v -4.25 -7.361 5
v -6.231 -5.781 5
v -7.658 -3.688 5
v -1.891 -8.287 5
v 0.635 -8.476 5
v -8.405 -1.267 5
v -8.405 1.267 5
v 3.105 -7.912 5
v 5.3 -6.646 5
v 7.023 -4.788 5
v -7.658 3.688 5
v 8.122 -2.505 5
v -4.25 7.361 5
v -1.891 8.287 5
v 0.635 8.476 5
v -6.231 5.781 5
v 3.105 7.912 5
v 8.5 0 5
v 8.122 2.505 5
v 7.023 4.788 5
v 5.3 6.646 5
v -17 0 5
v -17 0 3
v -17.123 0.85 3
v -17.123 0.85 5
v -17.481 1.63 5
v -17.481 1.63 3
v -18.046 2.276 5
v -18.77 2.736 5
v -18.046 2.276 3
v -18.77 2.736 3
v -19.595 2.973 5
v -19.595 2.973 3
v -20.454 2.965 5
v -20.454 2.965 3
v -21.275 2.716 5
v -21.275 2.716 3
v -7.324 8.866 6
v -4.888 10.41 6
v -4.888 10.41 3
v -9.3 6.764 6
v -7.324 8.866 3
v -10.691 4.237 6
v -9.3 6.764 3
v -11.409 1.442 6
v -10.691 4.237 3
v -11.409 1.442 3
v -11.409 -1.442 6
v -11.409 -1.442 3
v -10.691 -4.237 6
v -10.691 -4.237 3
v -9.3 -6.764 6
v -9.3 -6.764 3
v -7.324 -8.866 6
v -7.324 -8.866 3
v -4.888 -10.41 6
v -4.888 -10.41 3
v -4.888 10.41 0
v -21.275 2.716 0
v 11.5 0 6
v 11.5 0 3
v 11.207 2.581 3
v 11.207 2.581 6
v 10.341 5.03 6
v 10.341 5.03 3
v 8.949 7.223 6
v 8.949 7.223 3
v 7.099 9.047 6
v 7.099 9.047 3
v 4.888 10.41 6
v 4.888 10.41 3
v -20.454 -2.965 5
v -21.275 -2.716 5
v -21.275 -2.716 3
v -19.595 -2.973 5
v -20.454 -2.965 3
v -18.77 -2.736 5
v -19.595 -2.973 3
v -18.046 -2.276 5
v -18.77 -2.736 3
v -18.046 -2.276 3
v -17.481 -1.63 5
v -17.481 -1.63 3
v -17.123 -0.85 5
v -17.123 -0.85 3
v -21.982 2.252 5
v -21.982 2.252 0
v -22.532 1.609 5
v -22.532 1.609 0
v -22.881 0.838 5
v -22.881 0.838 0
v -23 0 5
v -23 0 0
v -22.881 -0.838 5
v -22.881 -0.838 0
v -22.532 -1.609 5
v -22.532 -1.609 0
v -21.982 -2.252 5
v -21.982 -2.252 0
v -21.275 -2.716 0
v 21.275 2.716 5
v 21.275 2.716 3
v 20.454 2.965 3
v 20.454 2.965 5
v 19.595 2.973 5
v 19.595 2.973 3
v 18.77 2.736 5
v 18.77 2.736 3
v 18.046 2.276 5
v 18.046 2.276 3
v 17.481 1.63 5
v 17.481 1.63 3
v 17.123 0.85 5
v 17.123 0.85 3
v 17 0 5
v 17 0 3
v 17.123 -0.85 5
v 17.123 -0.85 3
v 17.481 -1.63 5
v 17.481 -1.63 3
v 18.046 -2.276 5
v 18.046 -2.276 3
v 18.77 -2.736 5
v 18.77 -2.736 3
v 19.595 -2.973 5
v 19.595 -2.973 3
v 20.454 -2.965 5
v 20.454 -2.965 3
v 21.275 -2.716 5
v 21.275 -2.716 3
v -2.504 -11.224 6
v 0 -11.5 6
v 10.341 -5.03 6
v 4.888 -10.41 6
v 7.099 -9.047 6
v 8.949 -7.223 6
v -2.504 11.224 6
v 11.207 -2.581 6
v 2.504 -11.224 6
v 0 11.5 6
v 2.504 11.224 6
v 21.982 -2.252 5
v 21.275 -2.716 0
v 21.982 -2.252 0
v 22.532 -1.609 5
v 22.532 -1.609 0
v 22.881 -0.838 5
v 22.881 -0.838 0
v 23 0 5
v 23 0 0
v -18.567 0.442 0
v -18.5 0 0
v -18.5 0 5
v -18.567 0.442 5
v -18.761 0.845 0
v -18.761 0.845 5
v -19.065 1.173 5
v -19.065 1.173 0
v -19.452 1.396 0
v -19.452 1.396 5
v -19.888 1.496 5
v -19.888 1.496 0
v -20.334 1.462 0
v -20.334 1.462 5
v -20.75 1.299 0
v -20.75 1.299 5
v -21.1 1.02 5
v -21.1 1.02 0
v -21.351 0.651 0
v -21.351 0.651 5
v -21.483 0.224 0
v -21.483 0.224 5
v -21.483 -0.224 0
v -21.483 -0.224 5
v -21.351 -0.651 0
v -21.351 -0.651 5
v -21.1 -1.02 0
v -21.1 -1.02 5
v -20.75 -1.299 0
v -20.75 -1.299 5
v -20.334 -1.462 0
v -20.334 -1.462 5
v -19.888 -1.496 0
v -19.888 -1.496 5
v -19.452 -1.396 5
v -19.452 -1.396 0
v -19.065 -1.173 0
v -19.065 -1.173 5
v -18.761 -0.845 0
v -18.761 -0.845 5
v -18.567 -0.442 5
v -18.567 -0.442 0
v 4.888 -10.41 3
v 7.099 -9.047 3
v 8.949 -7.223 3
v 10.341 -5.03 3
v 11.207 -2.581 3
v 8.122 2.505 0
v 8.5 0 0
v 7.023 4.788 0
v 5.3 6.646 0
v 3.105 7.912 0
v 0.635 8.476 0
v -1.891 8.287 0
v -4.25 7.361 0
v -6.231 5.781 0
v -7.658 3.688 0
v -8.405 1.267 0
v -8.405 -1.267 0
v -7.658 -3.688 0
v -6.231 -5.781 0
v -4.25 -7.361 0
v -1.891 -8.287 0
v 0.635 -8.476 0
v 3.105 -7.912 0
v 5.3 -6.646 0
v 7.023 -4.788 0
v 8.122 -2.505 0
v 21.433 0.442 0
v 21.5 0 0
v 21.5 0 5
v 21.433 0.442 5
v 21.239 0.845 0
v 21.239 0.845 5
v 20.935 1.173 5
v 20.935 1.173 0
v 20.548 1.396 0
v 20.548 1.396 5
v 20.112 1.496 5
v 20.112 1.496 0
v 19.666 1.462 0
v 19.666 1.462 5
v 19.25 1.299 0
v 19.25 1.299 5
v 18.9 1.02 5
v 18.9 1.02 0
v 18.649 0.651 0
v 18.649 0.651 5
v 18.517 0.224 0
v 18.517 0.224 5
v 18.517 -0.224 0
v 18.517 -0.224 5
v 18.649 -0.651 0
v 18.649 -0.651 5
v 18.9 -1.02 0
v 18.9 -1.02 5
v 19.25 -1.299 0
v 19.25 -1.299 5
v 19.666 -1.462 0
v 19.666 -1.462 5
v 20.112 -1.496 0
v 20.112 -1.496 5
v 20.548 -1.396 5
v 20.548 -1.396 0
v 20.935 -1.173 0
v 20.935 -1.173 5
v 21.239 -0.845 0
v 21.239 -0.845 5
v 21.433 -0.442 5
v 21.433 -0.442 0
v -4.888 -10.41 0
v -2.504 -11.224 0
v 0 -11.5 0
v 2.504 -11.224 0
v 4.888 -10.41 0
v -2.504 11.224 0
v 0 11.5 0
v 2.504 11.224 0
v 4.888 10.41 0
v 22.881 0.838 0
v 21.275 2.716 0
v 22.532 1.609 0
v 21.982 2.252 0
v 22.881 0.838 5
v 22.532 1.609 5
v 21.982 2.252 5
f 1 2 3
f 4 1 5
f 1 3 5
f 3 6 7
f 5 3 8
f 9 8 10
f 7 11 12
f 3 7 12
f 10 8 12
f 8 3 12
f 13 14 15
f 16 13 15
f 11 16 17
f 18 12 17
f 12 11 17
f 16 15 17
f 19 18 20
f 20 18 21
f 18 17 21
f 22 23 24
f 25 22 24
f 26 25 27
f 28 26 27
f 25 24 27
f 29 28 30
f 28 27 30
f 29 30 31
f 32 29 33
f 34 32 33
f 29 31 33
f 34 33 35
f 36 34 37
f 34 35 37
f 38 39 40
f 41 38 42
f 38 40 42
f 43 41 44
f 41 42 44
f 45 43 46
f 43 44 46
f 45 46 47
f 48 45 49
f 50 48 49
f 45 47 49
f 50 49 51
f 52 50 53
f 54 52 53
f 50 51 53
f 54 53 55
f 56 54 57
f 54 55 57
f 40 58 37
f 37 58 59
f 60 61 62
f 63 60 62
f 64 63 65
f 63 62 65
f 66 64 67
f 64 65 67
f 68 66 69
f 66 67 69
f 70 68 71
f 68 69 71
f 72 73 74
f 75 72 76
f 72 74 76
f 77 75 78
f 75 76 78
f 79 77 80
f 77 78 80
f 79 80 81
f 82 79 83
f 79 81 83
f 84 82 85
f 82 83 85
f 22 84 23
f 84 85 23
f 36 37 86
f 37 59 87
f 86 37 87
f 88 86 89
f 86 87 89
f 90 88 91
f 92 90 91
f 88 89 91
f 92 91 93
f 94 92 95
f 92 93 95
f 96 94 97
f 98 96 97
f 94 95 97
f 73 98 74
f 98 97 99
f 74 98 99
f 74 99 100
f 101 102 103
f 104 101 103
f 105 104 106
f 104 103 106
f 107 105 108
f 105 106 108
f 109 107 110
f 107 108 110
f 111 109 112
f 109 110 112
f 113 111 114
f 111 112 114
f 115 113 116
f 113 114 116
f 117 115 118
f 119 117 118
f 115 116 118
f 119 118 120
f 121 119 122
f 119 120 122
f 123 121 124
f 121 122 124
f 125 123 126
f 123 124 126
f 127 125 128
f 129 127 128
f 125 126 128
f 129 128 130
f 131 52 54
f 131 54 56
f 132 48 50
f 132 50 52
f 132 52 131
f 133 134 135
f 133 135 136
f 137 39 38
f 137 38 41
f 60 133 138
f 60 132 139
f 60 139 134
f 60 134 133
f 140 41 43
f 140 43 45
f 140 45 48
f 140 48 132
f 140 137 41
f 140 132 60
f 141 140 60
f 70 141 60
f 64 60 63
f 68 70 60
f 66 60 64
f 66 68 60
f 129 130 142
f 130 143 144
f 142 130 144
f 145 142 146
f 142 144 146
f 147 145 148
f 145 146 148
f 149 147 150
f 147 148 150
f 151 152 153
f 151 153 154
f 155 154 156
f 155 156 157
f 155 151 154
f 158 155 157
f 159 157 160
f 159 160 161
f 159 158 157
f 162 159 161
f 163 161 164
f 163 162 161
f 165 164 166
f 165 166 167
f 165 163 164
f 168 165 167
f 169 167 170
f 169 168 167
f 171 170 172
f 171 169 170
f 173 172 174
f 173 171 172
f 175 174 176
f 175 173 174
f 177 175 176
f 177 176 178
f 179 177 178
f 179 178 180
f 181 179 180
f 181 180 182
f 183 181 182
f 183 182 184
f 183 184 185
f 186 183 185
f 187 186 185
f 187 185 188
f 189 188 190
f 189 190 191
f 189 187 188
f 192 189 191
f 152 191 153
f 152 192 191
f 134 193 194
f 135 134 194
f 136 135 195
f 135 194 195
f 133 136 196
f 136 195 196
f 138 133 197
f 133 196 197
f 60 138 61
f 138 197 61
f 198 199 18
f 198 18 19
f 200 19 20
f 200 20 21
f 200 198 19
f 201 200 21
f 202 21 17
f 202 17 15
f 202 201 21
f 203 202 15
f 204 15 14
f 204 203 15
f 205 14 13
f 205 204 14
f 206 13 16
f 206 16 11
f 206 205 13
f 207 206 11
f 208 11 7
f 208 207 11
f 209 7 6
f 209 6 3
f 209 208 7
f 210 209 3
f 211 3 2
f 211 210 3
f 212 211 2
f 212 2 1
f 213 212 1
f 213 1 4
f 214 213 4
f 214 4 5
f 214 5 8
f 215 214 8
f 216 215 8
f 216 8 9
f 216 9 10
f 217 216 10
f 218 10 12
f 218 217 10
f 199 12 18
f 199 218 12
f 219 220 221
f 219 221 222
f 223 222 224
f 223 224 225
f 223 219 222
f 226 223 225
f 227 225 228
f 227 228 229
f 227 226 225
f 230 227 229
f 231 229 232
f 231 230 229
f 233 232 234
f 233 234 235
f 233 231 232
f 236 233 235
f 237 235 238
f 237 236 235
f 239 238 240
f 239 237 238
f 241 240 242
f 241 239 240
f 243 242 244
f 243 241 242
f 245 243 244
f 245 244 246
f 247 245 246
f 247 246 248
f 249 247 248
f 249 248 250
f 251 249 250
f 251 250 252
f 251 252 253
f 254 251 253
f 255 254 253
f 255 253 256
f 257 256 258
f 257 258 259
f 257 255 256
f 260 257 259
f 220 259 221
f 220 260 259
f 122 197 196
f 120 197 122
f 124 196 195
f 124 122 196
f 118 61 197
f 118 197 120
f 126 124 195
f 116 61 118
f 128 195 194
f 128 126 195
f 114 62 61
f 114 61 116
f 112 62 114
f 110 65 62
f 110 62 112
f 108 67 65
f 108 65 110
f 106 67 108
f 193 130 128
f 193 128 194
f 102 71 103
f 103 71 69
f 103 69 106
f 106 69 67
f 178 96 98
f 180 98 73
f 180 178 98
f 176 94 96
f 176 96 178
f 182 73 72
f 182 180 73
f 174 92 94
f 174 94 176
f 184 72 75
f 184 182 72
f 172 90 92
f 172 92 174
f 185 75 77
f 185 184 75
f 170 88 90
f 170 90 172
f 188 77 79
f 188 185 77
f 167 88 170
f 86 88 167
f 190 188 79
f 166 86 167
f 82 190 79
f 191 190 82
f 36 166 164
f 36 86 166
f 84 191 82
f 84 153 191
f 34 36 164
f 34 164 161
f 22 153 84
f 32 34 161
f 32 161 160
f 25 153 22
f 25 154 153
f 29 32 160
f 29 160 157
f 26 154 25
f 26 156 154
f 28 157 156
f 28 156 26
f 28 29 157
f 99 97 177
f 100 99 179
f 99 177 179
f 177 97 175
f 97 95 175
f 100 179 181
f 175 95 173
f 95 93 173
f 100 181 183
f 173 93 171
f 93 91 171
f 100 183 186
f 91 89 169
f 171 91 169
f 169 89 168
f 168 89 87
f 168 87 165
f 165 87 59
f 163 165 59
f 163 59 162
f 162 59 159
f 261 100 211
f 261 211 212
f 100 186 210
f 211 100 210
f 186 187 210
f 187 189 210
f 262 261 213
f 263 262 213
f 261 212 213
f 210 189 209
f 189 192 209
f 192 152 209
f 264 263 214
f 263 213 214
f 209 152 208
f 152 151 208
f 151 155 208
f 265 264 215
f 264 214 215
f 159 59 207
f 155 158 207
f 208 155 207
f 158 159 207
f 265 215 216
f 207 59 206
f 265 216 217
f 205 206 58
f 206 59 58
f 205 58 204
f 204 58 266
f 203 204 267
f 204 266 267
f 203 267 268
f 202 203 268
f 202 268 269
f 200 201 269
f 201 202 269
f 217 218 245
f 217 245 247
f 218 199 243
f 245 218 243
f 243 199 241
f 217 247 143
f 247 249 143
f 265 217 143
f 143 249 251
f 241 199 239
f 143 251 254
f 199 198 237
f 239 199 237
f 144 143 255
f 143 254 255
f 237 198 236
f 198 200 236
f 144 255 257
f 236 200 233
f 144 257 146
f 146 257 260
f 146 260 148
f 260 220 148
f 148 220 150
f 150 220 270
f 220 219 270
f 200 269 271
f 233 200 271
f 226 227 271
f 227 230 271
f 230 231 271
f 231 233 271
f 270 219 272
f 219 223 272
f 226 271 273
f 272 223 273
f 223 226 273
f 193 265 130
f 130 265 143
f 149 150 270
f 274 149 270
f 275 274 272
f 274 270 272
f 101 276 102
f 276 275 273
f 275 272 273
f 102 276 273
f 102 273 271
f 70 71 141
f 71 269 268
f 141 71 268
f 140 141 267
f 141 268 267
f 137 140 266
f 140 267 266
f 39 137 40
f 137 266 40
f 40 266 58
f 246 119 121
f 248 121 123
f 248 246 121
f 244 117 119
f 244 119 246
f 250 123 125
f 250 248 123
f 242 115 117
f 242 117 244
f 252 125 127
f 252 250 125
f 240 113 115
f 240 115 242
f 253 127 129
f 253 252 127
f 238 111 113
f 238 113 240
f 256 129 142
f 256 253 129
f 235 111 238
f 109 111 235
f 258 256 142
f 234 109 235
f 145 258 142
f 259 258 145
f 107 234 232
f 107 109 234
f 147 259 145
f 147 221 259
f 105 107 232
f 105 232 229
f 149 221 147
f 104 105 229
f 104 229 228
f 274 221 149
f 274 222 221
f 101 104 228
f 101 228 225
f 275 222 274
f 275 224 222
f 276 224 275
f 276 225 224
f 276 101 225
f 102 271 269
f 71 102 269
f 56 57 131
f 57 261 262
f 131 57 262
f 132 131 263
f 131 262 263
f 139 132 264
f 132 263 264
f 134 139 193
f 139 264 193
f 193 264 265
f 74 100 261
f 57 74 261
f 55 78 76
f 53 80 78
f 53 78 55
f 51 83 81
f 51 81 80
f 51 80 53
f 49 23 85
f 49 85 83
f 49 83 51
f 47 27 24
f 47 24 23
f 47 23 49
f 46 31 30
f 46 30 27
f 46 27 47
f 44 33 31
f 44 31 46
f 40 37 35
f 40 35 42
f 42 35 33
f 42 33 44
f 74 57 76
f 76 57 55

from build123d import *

# Parameters (mm, degrees)
F0_R     = 8.5
F1_DEPTH = 6
F2_DEPTH = 5
F0_R_2   = 1.5
F3_DEPTH = 5
F4_DEPTH = 3


with BuildPart() as f1:
    # F0 (on Top) → F1 (new body)
    with BuildSketch(Plane.XY):
        with BuildLine():
            ThreePointArc((4.8875, -10.4097235194), (9.7071172343, -6.1661880445), (11.5, 0))
            ThreePointArc((11.5, 0), (9.7071172343, 6.1661880445), (4.8875, 10.4097235194))
            ThreePointArc((4.8875, 10.4097235194), (0, 11.5), (-4.8875, 10.4097235194))
            ThreePointArc((-4.8875, 10.4097235194), (-11.5, 0), (-4.8875, -10.4097235194))
            ThreePointArc((-4.8875, -10.4097235194), (0, -11.5), (4.8875, -10.4097235194))
        make_face()
        Circle(F0_R, mode=Mode.SUBTRACT)
        Circle(F0_R)
    extrude(amount=F1_DEPTH)

    # F0 (on Top) → F2 (cut)
    with BuildSketch(Plane.XY):
        Circle(F0_R)
    extrude(amount=F2_DEPTH, mode=Mode.SUBTRACT)



with BuildPart() as f3:
    # F0 (on Top) → F3 (new body)
    with BuildSketch(Plane.XY):
        with BuildLine():
            ThreePointArc((-17, 0), (-18.3914292058, 2.5322914524), (-21.275, 2.7155800485))
            ThreePointArc((-21.275, 2.7155800485), (-23, 0), (-21.275, -2.7155800485))
            ThreePointArc((-21.275, -2.7155800485), (-18.3914292058, -2.5322914524), (-17, 0))
        make_face()
        with Locations((-20, 0)):
            Circle(F0_R_2, mode=Mode.SUBTRACT)
    extrude(amount=F3_DEPTH)


with BuildPart() as f3b:
    # F0 (on Top) → F3, piece 2 (new body)
    with BuildSketch(Plane.XY):
        with BuildLine():
            ThreePointArc((23, 0), (22.5322914524, 1.6085707942), (21.275, 2.7155800485))
            ThreePointArc((21.275, 2.7155800485), (17, 0), (21.275, -2.7155800485))
            ThreePointArc((21.275, -2.7155800485), (22.5322914524, -1.6085707942), (23, 0))
        make_face()
        with Locations((20, 0)):
            Circle(F0_R_2, mode=Mode.SUBTRACT)
    extrude(amount=F3_DEPTH)


with BuildPart() as f1_1:
    add(f1.part)

    add(f3.part)  # F4 merges F3

    add(f3b.part)  # F4 merges F3b
    # F0 (on Top) → F4 (join)
    with BuildSketch(Plane.XY):
        with BuildLine():
            ThreePointArc((-4.8875, -10.4097235194), (-11.5, 0), (-4.8875, 10.4097235194))
            Line((-4.8875, 10.4097235194), (-21.275, 2.7155800485))
            ThreePointArc((-21.275, 2.7155800485), (-18.3914292058, 2.5322914524), (-17, 0))
            ThreePointArc((-17, 0), (-18.3914292058, -2.5322914524), (-21.275, -2.7155800485))
            Line((-21.275, -2.7155800485), (-4.8875, -10.4097235194))
        make_face()
        with BuildLine():
            ThreePointArc((4.8875, 10.4097235194), (9.7071172343, 6.1661880445), (11.5, 0))
            ThreePointArc((11.5, 0), (9.7071172343, -6.1661880445), (4.8875, -10.4097235194))
            Line((4.8875, -10.4097235194), (21.275, -2.7155800485))
            ThreePointArc((21.275, -2.7155800485), (17, 0), (21.275, 2.7155800485))
            Line((21.275, 2.7155800485), (4.8875, 10.4097235194))
        make_face()
    extrude(amount=F4_DEPTH)


solid = f1_1.part
